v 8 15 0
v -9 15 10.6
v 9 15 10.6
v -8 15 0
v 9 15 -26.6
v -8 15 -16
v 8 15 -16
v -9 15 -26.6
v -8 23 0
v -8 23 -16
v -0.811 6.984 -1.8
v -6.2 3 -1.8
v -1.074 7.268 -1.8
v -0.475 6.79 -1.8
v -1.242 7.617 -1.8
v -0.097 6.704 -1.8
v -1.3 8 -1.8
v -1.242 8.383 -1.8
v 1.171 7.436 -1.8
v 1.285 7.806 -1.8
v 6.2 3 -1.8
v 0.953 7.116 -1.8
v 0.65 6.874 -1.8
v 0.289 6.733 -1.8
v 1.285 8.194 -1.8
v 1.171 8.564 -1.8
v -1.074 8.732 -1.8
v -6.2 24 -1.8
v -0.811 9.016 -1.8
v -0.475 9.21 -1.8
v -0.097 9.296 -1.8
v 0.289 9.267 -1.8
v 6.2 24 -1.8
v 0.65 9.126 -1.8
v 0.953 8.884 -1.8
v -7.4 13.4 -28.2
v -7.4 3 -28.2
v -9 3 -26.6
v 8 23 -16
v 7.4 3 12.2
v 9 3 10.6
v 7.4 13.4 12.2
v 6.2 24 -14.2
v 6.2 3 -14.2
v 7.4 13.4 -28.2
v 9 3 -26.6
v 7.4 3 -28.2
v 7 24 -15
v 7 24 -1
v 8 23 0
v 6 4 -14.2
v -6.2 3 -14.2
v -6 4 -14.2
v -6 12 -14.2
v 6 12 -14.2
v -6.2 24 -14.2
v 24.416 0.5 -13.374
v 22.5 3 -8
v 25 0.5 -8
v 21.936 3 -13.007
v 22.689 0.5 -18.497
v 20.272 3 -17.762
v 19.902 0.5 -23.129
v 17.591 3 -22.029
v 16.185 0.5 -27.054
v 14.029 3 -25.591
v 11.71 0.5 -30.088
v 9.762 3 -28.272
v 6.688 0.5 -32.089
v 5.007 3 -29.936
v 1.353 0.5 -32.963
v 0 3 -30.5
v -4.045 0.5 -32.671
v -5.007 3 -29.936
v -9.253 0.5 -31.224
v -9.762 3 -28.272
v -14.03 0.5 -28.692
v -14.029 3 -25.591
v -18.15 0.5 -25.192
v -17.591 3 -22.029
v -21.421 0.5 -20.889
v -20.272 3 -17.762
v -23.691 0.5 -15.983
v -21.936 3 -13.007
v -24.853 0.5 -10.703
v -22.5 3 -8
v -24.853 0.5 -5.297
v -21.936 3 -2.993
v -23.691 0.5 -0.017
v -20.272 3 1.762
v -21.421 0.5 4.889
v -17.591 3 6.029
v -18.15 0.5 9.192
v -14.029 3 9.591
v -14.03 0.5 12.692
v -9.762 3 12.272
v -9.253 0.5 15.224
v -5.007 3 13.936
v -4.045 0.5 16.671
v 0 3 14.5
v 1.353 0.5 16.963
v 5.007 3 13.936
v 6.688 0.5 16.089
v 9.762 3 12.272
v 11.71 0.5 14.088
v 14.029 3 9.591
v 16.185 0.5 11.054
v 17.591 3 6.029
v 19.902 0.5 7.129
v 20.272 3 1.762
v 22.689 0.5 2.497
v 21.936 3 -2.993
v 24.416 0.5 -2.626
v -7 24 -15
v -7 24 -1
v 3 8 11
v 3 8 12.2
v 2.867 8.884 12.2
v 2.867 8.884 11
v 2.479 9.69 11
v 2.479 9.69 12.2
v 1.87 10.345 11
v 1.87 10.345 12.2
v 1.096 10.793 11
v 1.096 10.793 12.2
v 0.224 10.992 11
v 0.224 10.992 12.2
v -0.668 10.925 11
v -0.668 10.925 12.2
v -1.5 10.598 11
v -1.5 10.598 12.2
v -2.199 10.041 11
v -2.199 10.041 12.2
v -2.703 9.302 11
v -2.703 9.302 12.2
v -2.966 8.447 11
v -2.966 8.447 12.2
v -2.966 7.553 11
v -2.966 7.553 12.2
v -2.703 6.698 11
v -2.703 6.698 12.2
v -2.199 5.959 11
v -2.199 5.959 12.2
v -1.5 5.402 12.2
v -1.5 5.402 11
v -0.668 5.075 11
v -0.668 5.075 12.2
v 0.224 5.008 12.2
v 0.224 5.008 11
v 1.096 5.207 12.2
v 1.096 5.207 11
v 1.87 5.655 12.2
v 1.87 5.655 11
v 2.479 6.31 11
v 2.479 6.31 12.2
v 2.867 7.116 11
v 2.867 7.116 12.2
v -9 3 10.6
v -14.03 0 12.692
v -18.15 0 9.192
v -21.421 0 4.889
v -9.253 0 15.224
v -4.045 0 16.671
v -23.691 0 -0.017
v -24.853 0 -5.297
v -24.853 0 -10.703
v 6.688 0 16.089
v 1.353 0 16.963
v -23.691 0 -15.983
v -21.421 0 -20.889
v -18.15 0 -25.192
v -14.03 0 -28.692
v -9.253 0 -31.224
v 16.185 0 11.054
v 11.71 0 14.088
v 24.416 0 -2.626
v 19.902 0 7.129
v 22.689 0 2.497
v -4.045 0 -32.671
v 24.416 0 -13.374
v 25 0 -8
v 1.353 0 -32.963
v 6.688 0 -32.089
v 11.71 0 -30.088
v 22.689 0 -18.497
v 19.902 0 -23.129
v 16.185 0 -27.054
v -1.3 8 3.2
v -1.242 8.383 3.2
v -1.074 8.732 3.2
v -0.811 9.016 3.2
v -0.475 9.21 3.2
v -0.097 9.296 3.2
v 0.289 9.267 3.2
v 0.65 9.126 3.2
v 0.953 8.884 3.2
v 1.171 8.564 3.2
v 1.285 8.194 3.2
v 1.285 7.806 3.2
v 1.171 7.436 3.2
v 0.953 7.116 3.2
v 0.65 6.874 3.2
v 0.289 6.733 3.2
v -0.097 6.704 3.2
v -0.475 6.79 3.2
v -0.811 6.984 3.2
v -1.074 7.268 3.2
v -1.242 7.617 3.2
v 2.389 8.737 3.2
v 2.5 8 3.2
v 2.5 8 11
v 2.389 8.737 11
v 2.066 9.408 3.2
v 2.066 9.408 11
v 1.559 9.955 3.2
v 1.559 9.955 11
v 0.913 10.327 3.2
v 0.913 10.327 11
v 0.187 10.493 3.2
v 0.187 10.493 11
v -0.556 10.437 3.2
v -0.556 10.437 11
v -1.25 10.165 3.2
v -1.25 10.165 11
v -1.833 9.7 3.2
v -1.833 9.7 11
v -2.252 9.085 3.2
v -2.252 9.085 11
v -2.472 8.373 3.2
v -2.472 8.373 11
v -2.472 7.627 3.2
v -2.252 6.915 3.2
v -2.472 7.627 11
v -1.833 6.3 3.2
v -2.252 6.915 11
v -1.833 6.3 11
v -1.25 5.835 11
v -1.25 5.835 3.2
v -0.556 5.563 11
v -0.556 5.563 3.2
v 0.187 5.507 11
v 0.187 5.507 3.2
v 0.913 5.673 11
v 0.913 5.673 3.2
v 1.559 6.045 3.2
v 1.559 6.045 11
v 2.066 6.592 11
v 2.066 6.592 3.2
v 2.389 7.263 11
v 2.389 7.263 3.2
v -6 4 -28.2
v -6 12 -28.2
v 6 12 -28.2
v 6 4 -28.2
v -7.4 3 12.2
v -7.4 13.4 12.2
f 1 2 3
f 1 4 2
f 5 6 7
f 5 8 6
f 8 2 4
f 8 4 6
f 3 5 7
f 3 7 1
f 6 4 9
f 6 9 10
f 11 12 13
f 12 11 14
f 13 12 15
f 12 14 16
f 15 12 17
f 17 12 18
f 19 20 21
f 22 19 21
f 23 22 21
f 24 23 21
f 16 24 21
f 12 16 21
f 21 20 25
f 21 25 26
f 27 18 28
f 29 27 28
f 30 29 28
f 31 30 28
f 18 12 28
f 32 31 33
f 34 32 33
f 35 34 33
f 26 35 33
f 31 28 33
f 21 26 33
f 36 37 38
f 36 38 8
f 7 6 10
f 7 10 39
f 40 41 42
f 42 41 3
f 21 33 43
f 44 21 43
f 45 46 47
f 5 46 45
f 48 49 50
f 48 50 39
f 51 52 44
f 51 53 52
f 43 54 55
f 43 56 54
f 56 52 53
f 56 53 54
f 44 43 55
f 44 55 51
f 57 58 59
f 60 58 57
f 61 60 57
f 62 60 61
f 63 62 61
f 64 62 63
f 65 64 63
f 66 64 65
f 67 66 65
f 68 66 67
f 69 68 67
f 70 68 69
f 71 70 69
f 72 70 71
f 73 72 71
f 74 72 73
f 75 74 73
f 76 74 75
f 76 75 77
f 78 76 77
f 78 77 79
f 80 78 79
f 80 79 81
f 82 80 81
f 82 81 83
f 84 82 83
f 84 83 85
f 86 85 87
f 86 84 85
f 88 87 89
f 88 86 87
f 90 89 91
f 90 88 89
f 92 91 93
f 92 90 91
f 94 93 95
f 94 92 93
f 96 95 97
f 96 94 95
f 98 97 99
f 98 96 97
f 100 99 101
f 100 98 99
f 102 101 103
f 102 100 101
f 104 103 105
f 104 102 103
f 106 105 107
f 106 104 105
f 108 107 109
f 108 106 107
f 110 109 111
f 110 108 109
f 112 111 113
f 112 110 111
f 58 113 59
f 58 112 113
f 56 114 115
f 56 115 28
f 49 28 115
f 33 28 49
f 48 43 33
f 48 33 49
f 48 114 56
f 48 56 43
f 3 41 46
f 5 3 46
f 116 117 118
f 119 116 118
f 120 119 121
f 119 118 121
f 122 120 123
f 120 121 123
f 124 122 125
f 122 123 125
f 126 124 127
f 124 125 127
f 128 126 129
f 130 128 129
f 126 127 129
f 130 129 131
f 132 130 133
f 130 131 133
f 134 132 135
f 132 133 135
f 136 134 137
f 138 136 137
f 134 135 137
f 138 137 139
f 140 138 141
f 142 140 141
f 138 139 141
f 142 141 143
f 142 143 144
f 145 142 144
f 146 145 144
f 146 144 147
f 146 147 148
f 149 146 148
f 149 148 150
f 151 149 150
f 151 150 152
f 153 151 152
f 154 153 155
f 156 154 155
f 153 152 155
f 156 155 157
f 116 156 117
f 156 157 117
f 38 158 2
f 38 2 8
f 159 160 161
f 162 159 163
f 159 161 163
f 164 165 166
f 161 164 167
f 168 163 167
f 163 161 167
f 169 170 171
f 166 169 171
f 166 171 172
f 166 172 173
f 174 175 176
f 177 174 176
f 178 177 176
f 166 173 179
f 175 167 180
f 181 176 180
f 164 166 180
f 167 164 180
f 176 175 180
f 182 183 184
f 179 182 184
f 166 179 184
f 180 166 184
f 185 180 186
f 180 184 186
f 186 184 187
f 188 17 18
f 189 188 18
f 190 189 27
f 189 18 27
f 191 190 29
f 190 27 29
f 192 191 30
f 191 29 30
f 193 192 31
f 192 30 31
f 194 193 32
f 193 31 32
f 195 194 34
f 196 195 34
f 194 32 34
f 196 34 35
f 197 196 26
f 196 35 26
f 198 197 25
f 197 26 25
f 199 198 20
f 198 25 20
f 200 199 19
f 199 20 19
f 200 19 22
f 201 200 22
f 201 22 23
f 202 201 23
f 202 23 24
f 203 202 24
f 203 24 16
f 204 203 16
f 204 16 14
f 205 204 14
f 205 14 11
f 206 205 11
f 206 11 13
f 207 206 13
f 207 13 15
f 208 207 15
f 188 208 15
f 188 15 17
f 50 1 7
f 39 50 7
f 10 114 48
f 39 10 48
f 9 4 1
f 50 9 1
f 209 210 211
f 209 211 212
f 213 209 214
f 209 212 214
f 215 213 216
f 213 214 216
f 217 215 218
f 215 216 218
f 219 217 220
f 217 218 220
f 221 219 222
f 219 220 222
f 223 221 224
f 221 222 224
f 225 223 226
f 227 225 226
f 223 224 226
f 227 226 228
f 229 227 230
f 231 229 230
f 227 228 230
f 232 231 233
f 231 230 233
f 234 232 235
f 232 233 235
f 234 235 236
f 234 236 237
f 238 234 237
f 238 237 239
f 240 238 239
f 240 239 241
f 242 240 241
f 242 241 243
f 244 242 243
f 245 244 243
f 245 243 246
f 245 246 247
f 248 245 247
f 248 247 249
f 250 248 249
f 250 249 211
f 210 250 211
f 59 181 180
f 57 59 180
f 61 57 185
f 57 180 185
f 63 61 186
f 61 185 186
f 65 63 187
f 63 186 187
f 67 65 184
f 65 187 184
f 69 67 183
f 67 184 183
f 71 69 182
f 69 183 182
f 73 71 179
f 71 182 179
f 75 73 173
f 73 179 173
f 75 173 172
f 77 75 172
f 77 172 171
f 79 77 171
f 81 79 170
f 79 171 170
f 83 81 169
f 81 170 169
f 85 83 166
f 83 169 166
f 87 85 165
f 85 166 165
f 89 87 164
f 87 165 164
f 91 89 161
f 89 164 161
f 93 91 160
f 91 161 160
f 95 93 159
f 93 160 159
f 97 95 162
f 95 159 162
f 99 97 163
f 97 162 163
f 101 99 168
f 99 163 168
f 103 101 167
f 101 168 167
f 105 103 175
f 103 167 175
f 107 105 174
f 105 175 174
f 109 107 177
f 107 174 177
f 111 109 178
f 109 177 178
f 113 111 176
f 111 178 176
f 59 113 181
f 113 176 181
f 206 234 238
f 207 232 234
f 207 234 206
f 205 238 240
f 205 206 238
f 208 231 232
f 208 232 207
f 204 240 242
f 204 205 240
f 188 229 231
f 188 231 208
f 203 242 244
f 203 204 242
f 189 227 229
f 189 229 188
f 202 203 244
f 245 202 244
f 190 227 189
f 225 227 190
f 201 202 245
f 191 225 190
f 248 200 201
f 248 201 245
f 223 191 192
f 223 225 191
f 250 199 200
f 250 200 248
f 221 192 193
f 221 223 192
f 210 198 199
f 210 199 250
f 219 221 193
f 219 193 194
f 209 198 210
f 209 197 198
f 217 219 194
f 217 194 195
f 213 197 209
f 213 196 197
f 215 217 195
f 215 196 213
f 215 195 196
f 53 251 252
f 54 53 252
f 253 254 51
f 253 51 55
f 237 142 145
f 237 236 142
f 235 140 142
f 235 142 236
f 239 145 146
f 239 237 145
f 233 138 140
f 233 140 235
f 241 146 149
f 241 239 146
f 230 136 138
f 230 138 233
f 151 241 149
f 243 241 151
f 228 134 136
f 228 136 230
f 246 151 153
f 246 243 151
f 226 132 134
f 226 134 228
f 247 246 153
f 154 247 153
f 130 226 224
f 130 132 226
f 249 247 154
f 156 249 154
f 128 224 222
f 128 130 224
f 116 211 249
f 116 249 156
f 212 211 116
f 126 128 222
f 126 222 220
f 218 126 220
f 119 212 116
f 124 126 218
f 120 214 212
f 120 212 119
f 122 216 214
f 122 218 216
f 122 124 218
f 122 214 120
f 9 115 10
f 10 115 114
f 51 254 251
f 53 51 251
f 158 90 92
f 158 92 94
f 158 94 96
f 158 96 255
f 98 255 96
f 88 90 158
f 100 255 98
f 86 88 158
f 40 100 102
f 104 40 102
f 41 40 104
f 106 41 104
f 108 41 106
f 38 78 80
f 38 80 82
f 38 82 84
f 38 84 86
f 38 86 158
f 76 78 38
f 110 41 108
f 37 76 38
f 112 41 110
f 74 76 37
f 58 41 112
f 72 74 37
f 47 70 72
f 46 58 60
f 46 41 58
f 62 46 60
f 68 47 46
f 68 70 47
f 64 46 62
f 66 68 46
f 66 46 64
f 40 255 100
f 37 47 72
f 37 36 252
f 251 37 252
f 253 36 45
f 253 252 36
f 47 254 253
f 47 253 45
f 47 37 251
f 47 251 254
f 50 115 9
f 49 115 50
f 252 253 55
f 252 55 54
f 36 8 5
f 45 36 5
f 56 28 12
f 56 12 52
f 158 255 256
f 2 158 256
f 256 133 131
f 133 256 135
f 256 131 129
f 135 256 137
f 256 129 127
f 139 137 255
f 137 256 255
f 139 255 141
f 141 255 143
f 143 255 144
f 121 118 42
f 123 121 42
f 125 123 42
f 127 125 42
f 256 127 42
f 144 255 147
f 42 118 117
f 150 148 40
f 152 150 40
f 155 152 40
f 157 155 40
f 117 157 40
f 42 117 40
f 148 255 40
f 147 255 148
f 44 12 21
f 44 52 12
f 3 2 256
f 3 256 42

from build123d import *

# Parameters (mm, degrees)
SKETCH1_W           = 16
SKETCH1_H           = 16
BOSS_EXTRUDE1_DEPTH = 24
SKETCH12_W          = 12.4
SKETCH12_H          = 12.4
CUT_EXTRUDE6_DEPTH  = 22
SKETCH13_R          = 25
BOSS_EXTRUDE2_DEPTH = 3
CHAMFER1_SIZE       = 2.5
SKETCH14_W          = 18
SKETCH14_H          = 40.4
SKETCH14_W_2        = 16
SKETCH14_H_2        = 16
BOSS_EXTRUDE3_DEPTH = 12
CHAMFER2_SIZE       = 1.6
CHAMFER5_SIZE       = 1
SKETCH16_W          = 12
SKETCH16_H          = 8
CUT_EXTRUDE8_DEPTH  = 14
SKETCH15_R          = 1.3
CUT_EXTRUDE7_DEPTH  = 19.8
SKETCH17_R          = 2.5
CUT_EXTRUDE9_DEPTH  = 9
SKETCH19_R          = 3
CUT_EXTRUDE10_DEPTH = 1.2


with BuildPart() as part:
    # Sketch1 → Boss-Extrude1 (new body)
    with BuildSketch(Plane(origin=(0, 0, 0), x_dir=(1, 0, 0), z_dir=(0, 1, 0))):
        with Locations((0, 8)):
            Rectangle(SKETCH1_W, SKETCH1_H)
    extrude(amount=BOSS_EXTRUDE1_DEPTH)

    # Sketch12 → Cut-Extrude6 (cut)
    with BuildSketch(Plane(origin=(0, 24, 0), x_dir=(1, 0, 0), z_dir=(0, 1, 0))):
        with Locations((0, 8)):
            Rectangle(SKETCH12_W, SKETCH12_H)
    extrude(amount=-CUT_EXTRUDE6_DEPTH, mode=Mode.SUBTRACT)

    # Sketch13 → Boss-Extrude2 (add)
    with BuildSketch(Plane(origin=(0, 0, 0), x_dir=(1, 0, 0), z_dir=(0, 1, 0))):
        with Locations((0, 8)):
            Circle(SKETCH13_R)
    extrude(amount=BOSS_EXTRUDE2_DEPTH)

    # Chamfer1
    chamfer1_edges = [part.edges().sort_by_distance(p)[0] for p in [
        (-25, 3, -8),
    ]]
    chamfer(chamfer1_edges, length=CHAMFER1_SIZE)

    # Sketch14 → Boss-Extrude3 (add)
    with BuildSketch(Plane(origin=(0, 3, 0), x_dir=(1, 0, 0), z_dir=(0, 1, 0))):
        with Locations((0, 8)):
            Rectangle(SKETCH14_W, SKETCH14_H)
        with Locations((0, 8)):
            Rectangle(SKETCH14_W_2, SKETCH14_H_2, mode=Mode.SUBTRACT)
    extrude(amount=BOSS_EXTRUDE3_DEPTH)

    # Chamfer2
    chamfer2_edges = [part.edges().sort_by_distance(p)[0] for p in [
        (0, 15, 12.2),
        (0, 15, -28.2),
        (-9, 9, 12.2),
        (9, 9, 12.2),
        (9, 9, -28.2),
        (-9, 9, -28.2),
    ]]
    chamfer(chamfer2_edges, length=CHAMFER2_SIZE)

    # Chamfer5
    chamfer5_edges = [part.edges().sort_by_distance(p)[0] for p in [
        (0, 24, -16),
        (-8, 24, -8),
        (0, 24, 0),
        (8, 24, -8),
    ]]
    chamfer(chamfer5_edges, length=CHAMFER5_SIZE)

    # Sketch16 → Cut-Extrude8 (cut)
    with BuildSketch(Plane(origin=(0, 0, -28.2), x_dir=(-1, 0, 0), z_dir=(0, 0, -1))):
        with Locations((0, 8)):
            Rectangle(SKETCH16_W, SKETCH16_H)
    extrude(amount=-CUT_EXTRUDE8_DEPTH, mode=Mode.SUBTRACT)

    # Sketch15 → Cut-Extrude7 (cut, through all)
    with BuildSketch(Plane(origin=(0, 0, -1.8), x_dir=(-1, 0, 0), z_dir=(0, 0, -1))):
        with Locations((0, 8)):
            Circle(SKETCH15_R)
    extrude(amount=-CUT_EXTRUDE7_DEPTH, mode=Mode.SUBTRACT)

    # Sketch17 → Cut-Extrude9 (cut)
    with BuildSketch(Plane.XY.offset(12.2)):
        with Locations((0, 8)):
            Circle(SKETCH17_R)
    extrude(amount=-CUT_EXTRUDE9_DEPTH, mode=Mode.SUBTRACT)

    # Sketch19 → Cut-Extrude10 (cut)
    with BuildSketch(Plane.XY.offset(12.2)):
        with Locations((0, 8)):
            Circle(SKETCH19_R)
    extrude(amount=-CUT_EXTRUDE10_DEPTH, mode=Mode.SUBTRACT)


solid = part.part
